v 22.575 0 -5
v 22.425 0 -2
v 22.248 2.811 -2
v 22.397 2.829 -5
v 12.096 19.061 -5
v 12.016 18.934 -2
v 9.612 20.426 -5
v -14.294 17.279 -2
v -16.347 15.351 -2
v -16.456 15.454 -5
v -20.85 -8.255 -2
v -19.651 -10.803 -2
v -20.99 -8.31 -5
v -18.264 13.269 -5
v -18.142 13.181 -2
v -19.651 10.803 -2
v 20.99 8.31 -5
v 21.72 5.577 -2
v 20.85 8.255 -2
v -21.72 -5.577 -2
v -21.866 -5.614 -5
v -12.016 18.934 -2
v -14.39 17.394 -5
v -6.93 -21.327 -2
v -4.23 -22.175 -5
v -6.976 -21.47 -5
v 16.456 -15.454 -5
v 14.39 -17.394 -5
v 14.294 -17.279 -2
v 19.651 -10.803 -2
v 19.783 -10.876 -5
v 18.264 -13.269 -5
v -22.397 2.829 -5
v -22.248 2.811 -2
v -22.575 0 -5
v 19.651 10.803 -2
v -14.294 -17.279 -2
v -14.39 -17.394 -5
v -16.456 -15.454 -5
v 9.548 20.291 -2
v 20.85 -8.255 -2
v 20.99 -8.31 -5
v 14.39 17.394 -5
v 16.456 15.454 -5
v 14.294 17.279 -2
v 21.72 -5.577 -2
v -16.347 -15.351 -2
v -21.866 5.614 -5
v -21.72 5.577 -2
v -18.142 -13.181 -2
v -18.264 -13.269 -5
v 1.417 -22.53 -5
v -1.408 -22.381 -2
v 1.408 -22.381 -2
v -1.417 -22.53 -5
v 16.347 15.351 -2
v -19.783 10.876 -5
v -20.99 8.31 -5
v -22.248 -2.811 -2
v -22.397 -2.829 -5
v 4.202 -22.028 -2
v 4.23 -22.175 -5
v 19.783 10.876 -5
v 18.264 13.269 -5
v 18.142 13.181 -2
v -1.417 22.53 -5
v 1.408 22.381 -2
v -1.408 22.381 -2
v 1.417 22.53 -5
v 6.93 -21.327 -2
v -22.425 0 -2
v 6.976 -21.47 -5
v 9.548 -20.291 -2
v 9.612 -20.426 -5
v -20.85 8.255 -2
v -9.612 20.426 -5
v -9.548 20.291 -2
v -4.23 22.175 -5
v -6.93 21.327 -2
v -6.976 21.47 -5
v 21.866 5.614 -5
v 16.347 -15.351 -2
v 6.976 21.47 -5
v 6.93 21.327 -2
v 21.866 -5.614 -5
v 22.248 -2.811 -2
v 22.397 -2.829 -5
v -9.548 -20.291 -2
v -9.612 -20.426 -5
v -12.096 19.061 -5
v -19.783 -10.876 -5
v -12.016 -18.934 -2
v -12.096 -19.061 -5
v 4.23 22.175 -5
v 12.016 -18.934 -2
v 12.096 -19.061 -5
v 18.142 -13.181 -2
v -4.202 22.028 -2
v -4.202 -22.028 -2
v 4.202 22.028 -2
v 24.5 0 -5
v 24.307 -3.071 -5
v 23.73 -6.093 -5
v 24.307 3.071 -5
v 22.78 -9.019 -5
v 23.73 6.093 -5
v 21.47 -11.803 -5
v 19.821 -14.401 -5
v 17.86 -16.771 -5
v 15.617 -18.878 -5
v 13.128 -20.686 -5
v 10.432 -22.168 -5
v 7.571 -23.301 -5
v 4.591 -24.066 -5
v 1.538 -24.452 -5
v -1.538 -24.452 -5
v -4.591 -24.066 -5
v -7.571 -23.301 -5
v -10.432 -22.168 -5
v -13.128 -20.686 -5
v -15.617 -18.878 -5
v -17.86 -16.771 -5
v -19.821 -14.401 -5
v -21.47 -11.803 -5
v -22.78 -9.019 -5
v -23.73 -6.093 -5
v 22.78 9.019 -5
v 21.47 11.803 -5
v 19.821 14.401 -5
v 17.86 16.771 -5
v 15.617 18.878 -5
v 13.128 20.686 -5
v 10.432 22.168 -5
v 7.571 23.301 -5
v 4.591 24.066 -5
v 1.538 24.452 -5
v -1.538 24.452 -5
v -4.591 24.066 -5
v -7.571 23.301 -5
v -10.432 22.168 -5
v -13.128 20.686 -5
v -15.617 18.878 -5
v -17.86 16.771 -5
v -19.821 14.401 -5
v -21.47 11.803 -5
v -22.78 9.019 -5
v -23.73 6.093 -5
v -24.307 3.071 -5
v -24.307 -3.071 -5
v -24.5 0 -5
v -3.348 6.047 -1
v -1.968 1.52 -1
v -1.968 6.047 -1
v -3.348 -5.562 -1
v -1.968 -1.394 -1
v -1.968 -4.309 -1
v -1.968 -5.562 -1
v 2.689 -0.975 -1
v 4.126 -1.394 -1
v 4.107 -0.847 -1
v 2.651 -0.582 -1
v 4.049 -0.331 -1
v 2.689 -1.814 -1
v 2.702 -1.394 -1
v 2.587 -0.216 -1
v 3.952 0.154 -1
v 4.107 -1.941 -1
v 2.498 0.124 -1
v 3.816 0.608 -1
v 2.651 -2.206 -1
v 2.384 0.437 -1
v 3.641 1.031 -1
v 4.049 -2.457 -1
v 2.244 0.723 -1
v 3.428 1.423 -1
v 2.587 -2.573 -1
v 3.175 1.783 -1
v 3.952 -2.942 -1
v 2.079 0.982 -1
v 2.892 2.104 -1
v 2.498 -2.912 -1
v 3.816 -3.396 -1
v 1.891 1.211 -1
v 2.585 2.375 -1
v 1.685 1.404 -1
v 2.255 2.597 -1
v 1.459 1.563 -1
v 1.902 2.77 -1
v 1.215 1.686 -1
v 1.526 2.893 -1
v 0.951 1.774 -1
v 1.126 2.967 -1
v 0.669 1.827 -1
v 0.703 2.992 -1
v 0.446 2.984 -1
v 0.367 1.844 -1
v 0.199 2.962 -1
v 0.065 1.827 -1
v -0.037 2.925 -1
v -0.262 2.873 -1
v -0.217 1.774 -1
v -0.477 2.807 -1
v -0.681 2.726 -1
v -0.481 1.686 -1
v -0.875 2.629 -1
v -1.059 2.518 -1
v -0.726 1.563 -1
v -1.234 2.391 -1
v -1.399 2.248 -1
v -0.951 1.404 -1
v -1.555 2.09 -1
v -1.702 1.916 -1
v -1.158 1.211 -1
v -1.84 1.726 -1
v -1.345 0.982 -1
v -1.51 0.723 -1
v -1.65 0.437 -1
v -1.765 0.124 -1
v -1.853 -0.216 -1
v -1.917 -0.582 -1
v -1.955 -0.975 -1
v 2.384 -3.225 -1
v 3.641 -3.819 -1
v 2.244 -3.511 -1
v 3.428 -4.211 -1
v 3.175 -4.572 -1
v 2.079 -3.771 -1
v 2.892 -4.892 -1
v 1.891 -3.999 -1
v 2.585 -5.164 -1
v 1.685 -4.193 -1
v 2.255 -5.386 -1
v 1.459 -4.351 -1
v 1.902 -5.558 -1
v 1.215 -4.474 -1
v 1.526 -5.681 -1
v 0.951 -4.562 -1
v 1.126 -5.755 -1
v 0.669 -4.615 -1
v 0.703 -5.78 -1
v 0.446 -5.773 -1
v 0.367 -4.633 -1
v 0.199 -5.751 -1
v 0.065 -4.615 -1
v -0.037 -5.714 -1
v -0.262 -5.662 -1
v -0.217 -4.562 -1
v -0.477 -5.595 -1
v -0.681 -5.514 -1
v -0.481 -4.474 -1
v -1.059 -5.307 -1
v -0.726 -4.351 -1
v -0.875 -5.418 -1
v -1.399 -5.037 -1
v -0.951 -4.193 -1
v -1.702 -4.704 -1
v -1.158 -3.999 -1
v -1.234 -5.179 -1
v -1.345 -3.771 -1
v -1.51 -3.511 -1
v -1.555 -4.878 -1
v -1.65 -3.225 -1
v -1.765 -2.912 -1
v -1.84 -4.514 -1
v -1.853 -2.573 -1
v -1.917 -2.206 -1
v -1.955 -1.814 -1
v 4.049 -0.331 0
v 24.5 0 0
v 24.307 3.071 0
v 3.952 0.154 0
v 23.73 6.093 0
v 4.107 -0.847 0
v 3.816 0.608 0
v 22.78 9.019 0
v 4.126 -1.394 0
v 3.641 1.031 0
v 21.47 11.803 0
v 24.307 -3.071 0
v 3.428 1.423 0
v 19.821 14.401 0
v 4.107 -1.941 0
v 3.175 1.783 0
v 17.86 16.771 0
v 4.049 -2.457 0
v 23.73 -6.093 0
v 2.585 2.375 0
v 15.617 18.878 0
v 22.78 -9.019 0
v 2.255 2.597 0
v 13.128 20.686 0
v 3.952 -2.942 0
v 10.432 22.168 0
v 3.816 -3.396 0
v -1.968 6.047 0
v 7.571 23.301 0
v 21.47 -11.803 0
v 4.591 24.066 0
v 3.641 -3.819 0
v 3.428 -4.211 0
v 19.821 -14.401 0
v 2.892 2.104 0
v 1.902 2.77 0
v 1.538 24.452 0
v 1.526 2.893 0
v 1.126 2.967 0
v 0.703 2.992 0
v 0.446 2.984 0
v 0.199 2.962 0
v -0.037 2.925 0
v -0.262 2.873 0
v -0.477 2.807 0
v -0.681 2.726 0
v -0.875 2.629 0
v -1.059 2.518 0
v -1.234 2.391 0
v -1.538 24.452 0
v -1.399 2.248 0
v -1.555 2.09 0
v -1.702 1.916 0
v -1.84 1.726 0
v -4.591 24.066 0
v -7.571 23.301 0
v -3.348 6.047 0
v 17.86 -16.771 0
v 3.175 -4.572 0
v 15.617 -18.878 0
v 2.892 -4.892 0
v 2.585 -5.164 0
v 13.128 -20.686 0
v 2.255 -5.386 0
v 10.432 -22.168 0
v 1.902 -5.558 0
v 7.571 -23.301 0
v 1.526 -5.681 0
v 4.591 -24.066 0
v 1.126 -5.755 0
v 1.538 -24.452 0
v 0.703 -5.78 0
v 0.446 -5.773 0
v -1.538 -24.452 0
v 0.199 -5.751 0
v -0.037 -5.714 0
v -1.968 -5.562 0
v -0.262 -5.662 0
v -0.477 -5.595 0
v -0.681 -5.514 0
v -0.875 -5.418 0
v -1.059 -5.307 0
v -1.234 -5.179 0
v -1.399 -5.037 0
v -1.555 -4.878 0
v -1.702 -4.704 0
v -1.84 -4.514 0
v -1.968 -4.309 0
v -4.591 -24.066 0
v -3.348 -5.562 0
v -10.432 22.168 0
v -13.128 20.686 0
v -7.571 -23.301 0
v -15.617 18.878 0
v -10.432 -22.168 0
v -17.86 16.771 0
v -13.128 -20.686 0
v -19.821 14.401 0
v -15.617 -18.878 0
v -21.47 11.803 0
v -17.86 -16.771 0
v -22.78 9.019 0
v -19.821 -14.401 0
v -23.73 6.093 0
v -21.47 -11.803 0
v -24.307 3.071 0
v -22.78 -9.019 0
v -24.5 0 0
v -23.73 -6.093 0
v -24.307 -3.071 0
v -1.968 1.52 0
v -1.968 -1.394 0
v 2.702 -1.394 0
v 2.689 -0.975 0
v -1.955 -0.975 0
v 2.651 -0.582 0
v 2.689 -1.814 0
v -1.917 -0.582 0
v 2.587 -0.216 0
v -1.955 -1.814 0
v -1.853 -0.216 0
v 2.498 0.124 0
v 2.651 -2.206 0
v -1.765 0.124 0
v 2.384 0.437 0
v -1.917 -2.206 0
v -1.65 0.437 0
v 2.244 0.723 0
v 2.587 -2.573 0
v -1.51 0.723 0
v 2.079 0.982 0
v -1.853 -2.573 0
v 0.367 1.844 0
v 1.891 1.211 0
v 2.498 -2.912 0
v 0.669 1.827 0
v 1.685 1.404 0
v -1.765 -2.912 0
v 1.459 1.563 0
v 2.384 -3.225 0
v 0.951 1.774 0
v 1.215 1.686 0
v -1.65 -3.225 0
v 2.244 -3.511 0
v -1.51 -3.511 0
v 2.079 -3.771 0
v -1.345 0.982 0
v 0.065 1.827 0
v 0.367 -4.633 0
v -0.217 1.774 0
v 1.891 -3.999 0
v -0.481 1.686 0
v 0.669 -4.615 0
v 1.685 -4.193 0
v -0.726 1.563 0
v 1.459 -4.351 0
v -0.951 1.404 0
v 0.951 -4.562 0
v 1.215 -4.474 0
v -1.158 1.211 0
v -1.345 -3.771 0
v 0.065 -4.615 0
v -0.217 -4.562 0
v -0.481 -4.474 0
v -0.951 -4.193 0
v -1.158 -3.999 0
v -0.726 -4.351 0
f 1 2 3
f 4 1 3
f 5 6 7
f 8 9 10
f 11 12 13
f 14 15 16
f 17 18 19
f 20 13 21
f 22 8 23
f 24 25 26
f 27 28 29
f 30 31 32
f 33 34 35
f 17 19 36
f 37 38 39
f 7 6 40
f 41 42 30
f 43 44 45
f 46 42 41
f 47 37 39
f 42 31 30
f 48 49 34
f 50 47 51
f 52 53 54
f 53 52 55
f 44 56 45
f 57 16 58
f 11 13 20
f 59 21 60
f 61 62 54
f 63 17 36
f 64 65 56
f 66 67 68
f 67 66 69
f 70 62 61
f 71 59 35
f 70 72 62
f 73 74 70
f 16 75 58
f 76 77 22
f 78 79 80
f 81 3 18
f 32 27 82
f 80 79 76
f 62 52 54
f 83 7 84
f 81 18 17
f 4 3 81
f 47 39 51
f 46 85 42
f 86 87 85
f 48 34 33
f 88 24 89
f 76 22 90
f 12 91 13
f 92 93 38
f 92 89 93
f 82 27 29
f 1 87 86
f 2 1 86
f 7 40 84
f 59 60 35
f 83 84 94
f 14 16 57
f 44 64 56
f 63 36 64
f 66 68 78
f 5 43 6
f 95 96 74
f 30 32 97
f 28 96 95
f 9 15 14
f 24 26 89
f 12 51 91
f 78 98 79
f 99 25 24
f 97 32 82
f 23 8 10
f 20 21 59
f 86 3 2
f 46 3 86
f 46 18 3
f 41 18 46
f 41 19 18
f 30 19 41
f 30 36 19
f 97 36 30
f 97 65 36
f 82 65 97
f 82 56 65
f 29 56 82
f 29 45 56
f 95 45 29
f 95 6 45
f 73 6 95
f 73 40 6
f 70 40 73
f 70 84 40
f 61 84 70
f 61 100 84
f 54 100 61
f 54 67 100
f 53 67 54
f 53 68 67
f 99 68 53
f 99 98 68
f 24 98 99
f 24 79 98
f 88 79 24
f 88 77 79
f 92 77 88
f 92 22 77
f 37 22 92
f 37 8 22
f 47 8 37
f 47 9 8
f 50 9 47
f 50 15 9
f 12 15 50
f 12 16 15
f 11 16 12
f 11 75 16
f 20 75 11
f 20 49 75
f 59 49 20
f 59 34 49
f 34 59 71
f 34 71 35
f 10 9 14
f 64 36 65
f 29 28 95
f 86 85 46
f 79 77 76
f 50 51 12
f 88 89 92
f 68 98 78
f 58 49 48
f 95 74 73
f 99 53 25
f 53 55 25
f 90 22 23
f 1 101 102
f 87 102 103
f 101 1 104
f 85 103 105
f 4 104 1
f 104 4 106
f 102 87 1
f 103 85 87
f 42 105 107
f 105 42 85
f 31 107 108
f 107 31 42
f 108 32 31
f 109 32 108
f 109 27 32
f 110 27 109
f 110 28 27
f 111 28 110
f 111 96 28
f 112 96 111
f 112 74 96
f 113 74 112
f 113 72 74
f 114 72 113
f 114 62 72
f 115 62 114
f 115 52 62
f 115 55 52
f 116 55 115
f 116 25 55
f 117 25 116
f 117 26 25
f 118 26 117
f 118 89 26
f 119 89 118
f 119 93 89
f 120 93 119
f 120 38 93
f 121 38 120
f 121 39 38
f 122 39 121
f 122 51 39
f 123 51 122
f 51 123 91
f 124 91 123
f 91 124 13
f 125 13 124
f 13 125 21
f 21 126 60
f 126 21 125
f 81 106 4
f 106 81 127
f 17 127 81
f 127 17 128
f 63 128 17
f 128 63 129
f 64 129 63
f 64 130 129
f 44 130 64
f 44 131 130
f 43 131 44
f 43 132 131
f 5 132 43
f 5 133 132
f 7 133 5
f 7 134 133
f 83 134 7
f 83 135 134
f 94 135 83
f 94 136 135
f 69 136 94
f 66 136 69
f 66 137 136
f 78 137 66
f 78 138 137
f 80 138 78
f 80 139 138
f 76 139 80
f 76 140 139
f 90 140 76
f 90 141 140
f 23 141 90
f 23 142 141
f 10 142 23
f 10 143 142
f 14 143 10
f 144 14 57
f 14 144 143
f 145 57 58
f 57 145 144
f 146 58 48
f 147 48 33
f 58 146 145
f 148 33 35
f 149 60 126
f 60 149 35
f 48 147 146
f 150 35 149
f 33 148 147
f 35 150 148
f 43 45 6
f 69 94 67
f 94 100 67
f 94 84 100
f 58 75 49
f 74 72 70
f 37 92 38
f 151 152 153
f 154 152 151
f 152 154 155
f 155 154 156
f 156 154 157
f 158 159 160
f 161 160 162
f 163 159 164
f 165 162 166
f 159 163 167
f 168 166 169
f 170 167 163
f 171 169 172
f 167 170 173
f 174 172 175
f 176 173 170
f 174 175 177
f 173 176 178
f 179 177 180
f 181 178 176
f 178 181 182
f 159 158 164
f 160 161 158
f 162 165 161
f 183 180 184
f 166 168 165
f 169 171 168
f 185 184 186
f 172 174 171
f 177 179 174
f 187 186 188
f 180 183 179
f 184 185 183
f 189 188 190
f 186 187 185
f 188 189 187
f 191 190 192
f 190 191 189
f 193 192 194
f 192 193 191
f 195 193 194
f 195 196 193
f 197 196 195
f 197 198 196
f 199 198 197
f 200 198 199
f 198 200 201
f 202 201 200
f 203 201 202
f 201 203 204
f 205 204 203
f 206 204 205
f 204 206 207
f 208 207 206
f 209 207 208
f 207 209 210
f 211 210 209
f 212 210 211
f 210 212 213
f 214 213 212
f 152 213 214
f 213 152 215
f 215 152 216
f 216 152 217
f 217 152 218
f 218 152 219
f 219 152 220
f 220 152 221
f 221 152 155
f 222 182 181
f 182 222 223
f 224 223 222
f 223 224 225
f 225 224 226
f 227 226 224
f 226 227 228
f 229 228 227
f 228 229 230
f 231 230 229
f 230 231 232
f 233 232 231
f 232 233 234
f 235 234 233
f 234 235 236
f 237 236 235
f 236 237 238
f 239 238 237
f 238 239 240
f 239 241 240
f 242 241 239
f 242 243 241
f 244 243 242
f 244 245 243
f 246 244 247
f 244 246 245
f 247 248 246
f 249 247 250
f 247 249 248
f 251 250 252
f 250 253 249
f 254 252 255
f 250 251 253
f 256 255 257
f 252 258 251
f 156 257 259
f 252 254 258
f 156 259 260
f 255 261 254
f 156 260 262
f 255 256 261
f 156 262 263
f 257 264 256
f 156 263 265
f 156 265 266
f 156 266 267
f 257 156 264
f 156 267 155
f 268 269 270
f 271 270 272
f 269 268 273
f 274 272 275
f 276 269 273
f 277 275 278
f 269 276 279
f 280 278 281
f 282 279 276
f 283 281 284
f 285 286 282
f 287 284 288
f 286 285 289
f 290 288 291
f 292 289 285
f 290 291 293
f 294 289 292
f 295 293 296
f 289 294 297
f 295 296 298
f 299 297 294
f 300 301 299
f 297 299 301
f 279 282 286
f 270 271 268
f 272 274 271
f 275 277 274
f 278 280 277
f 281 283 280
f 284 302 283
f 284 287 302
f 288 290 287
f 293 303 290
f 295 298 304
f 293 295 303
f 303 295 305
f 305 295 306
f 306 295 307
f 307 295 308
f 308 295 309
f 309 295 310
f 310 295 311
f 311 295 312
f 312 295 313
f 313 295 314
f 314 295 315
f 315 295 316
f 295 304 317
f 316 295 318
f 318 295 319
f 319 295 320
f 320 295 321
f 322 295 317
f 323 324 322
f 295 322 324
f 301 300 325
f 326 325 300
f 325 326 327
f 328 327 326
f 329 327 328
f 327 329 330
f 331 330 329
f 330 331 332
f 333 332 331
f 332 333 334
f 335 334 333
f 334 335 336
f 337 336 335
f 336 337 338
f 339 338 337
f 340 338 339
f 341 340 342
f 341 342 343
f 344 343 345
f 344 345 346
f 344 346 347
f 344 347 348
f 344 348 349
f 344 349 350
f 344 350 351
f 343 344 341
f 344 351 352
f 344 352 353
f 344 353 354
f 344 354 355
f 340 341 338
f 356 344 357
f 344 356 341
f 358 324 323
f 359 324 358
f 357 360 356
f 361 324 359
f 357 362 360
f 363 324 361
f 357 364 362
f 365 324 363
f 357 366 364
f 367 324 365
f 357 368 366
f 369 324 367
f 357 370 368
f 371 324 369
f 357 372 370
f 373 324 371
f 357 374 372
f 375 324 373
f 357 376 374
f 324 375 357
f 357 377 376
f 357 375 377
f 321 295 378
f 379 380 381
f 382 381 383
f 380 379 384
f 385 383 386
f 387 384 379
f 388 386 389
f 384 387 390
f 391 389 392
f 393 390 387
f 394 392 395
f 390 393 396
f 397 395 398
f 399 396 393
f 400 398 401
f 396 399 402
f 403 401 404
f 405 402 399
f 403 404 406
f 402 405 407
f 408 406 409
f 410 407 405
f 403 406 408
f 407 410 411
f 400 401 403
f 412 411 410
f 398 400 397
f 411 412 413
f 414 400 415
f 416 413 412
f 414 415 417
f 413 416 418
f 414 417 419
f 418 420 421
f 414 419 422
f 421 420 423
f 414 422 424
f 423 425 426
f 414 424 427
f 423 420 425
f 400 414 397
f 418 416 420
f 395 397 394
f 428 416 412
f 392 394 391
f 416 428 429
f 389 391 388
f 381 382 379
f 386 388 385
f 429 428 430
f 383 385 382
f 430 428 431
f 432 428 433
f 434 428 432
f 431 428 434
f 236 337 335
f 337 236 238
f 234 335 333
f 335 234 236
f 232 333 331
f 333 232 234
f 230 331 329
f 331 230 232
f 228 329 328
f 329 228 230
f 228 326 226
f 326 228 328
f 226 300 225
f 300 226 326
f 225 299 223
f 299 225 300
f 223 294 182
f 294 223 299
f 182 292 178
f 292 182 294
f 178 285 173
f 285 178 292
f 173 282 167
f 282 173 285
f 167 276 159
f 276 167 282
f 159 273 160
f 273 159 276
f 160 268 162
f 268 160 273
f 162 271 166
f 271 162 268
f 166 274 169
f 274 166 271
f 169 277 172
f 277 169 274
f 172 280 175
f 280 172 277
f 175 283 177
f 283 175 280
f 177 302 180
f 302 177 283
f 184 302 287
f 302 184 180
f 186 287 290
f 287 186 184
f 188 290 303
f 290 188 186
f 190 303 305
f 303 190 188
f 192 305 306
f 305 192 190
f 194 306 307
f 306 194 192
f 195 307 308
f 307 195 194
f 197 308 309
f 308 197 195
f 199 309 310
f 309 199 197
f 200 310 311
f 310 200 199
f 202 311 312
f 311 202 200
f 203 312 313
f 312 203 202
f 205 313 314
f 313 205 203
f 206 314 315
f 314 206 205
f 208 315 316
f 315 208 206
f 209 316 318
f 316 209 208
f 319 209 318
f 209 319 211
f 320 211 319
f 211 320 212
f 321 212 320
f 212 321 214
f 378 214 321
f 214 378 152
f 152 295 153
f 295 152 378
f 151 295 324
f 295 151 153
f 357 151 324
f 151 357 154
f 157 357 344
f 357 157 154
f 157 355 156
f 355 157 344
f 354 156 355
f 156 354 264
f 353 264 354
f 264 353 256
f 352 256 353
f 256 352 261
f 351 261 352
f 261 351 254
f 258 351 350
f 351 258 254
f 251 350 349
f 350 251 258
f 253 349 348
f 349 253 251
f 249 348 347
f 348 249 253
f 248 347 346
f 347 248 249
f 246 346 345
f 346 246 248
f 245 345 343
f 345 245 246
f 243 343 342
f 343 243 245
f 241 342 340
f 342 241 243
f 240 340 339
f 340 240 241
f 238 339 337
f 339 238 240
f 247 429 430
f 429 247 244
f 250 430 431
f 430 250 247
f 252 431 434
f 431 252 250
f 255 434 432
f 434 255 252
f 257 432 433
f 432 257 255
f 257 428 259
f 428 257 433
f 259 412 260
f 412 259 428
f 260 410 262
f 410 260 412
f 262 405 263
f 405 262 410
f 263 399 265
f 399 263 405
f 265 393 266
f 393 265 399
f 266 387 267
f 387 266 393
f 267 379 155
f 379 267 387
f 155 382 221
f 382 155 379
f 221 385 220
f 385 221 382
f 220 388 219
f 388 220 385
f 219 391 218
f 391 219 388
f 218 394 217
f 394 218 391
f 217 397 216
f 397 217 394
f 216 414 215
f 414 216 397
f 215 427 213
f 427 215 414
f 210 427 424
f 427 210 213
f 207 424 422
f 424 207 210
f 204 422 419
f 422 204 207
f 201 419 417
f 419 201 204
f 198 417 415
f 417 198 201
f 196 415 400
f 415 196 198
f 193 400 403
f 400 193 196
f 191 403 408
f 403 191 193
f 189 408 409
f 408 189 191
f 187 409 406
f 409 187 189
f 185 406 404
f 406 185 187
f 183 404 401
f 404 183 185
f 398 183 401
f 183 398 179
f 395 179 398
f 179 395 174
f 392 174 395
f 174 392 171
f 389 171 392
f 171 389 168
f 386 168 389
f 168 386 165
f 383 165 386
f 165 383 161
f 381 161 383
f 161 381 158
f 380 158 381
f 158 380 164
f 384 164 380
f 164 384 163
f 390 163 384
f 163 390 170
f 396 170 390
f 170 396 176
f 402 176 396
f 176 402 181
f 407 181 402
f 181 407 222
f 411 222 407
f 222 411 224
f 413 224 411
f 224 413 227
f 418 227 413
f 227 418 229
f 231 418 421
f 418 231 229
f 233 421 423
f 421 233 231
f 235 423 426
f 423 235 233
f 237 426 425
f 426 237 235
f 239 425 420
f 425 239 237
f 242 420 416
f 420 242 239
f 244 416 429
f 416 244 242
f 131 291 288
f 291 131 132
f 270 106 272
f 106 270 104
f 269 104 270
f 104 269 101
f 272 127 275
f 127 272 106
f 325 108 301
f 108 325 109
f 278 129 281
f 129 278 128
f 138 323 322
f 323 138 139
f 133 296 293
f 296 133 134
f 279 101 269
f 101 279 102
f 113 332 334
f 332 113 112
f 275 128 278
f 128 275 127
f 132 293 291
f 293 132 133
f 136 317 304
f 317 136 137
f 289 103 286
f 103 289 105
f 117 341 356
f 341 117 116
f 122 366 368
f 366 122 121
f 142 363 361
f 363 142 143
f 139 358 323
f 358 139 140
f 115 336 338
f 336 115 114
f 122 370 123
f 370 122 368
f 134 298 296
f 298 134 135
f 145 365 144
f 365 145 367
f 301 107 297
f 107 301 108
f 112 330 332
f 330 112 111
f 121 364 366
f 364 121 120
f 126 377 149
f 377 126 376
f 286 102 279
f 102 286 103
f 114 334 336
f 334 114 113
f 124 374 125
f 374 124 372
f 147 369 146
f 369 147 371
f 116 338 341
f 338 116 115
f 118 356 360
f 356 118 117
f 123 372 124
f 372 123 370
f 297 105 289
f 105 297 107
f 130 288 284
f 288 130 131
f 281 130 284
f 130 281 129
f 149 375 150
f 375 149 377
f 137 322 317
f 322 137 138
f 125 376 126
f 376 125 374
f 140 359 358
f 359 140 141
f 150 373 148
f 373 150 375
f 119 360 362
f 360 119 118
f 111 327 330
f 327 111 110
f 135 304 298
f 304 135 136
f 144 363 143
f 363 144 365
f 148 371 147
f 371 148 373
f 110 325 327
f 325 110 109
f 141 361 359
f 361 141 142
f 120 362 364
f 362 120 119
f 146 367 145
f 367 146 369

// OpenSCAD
$fn = 50;

difference() {
	union() {
		translate(v = [0, 0, -5.0]) {
			cylinder(h = 5, r = 24.5);
		}
	}
	union() {
		#translate(v = [0, 0, -5.0]) {
			cylinder(h = 3, r1 = 22.575, r2 = 22.425);
		}
		translate(v = [0, 0, -1]) {
			linear_extrude(height = 1) {
				text(font = "Webdings", halign = "center", size = 11, text = "b", valign = "center");
			}
		}
	}
}
